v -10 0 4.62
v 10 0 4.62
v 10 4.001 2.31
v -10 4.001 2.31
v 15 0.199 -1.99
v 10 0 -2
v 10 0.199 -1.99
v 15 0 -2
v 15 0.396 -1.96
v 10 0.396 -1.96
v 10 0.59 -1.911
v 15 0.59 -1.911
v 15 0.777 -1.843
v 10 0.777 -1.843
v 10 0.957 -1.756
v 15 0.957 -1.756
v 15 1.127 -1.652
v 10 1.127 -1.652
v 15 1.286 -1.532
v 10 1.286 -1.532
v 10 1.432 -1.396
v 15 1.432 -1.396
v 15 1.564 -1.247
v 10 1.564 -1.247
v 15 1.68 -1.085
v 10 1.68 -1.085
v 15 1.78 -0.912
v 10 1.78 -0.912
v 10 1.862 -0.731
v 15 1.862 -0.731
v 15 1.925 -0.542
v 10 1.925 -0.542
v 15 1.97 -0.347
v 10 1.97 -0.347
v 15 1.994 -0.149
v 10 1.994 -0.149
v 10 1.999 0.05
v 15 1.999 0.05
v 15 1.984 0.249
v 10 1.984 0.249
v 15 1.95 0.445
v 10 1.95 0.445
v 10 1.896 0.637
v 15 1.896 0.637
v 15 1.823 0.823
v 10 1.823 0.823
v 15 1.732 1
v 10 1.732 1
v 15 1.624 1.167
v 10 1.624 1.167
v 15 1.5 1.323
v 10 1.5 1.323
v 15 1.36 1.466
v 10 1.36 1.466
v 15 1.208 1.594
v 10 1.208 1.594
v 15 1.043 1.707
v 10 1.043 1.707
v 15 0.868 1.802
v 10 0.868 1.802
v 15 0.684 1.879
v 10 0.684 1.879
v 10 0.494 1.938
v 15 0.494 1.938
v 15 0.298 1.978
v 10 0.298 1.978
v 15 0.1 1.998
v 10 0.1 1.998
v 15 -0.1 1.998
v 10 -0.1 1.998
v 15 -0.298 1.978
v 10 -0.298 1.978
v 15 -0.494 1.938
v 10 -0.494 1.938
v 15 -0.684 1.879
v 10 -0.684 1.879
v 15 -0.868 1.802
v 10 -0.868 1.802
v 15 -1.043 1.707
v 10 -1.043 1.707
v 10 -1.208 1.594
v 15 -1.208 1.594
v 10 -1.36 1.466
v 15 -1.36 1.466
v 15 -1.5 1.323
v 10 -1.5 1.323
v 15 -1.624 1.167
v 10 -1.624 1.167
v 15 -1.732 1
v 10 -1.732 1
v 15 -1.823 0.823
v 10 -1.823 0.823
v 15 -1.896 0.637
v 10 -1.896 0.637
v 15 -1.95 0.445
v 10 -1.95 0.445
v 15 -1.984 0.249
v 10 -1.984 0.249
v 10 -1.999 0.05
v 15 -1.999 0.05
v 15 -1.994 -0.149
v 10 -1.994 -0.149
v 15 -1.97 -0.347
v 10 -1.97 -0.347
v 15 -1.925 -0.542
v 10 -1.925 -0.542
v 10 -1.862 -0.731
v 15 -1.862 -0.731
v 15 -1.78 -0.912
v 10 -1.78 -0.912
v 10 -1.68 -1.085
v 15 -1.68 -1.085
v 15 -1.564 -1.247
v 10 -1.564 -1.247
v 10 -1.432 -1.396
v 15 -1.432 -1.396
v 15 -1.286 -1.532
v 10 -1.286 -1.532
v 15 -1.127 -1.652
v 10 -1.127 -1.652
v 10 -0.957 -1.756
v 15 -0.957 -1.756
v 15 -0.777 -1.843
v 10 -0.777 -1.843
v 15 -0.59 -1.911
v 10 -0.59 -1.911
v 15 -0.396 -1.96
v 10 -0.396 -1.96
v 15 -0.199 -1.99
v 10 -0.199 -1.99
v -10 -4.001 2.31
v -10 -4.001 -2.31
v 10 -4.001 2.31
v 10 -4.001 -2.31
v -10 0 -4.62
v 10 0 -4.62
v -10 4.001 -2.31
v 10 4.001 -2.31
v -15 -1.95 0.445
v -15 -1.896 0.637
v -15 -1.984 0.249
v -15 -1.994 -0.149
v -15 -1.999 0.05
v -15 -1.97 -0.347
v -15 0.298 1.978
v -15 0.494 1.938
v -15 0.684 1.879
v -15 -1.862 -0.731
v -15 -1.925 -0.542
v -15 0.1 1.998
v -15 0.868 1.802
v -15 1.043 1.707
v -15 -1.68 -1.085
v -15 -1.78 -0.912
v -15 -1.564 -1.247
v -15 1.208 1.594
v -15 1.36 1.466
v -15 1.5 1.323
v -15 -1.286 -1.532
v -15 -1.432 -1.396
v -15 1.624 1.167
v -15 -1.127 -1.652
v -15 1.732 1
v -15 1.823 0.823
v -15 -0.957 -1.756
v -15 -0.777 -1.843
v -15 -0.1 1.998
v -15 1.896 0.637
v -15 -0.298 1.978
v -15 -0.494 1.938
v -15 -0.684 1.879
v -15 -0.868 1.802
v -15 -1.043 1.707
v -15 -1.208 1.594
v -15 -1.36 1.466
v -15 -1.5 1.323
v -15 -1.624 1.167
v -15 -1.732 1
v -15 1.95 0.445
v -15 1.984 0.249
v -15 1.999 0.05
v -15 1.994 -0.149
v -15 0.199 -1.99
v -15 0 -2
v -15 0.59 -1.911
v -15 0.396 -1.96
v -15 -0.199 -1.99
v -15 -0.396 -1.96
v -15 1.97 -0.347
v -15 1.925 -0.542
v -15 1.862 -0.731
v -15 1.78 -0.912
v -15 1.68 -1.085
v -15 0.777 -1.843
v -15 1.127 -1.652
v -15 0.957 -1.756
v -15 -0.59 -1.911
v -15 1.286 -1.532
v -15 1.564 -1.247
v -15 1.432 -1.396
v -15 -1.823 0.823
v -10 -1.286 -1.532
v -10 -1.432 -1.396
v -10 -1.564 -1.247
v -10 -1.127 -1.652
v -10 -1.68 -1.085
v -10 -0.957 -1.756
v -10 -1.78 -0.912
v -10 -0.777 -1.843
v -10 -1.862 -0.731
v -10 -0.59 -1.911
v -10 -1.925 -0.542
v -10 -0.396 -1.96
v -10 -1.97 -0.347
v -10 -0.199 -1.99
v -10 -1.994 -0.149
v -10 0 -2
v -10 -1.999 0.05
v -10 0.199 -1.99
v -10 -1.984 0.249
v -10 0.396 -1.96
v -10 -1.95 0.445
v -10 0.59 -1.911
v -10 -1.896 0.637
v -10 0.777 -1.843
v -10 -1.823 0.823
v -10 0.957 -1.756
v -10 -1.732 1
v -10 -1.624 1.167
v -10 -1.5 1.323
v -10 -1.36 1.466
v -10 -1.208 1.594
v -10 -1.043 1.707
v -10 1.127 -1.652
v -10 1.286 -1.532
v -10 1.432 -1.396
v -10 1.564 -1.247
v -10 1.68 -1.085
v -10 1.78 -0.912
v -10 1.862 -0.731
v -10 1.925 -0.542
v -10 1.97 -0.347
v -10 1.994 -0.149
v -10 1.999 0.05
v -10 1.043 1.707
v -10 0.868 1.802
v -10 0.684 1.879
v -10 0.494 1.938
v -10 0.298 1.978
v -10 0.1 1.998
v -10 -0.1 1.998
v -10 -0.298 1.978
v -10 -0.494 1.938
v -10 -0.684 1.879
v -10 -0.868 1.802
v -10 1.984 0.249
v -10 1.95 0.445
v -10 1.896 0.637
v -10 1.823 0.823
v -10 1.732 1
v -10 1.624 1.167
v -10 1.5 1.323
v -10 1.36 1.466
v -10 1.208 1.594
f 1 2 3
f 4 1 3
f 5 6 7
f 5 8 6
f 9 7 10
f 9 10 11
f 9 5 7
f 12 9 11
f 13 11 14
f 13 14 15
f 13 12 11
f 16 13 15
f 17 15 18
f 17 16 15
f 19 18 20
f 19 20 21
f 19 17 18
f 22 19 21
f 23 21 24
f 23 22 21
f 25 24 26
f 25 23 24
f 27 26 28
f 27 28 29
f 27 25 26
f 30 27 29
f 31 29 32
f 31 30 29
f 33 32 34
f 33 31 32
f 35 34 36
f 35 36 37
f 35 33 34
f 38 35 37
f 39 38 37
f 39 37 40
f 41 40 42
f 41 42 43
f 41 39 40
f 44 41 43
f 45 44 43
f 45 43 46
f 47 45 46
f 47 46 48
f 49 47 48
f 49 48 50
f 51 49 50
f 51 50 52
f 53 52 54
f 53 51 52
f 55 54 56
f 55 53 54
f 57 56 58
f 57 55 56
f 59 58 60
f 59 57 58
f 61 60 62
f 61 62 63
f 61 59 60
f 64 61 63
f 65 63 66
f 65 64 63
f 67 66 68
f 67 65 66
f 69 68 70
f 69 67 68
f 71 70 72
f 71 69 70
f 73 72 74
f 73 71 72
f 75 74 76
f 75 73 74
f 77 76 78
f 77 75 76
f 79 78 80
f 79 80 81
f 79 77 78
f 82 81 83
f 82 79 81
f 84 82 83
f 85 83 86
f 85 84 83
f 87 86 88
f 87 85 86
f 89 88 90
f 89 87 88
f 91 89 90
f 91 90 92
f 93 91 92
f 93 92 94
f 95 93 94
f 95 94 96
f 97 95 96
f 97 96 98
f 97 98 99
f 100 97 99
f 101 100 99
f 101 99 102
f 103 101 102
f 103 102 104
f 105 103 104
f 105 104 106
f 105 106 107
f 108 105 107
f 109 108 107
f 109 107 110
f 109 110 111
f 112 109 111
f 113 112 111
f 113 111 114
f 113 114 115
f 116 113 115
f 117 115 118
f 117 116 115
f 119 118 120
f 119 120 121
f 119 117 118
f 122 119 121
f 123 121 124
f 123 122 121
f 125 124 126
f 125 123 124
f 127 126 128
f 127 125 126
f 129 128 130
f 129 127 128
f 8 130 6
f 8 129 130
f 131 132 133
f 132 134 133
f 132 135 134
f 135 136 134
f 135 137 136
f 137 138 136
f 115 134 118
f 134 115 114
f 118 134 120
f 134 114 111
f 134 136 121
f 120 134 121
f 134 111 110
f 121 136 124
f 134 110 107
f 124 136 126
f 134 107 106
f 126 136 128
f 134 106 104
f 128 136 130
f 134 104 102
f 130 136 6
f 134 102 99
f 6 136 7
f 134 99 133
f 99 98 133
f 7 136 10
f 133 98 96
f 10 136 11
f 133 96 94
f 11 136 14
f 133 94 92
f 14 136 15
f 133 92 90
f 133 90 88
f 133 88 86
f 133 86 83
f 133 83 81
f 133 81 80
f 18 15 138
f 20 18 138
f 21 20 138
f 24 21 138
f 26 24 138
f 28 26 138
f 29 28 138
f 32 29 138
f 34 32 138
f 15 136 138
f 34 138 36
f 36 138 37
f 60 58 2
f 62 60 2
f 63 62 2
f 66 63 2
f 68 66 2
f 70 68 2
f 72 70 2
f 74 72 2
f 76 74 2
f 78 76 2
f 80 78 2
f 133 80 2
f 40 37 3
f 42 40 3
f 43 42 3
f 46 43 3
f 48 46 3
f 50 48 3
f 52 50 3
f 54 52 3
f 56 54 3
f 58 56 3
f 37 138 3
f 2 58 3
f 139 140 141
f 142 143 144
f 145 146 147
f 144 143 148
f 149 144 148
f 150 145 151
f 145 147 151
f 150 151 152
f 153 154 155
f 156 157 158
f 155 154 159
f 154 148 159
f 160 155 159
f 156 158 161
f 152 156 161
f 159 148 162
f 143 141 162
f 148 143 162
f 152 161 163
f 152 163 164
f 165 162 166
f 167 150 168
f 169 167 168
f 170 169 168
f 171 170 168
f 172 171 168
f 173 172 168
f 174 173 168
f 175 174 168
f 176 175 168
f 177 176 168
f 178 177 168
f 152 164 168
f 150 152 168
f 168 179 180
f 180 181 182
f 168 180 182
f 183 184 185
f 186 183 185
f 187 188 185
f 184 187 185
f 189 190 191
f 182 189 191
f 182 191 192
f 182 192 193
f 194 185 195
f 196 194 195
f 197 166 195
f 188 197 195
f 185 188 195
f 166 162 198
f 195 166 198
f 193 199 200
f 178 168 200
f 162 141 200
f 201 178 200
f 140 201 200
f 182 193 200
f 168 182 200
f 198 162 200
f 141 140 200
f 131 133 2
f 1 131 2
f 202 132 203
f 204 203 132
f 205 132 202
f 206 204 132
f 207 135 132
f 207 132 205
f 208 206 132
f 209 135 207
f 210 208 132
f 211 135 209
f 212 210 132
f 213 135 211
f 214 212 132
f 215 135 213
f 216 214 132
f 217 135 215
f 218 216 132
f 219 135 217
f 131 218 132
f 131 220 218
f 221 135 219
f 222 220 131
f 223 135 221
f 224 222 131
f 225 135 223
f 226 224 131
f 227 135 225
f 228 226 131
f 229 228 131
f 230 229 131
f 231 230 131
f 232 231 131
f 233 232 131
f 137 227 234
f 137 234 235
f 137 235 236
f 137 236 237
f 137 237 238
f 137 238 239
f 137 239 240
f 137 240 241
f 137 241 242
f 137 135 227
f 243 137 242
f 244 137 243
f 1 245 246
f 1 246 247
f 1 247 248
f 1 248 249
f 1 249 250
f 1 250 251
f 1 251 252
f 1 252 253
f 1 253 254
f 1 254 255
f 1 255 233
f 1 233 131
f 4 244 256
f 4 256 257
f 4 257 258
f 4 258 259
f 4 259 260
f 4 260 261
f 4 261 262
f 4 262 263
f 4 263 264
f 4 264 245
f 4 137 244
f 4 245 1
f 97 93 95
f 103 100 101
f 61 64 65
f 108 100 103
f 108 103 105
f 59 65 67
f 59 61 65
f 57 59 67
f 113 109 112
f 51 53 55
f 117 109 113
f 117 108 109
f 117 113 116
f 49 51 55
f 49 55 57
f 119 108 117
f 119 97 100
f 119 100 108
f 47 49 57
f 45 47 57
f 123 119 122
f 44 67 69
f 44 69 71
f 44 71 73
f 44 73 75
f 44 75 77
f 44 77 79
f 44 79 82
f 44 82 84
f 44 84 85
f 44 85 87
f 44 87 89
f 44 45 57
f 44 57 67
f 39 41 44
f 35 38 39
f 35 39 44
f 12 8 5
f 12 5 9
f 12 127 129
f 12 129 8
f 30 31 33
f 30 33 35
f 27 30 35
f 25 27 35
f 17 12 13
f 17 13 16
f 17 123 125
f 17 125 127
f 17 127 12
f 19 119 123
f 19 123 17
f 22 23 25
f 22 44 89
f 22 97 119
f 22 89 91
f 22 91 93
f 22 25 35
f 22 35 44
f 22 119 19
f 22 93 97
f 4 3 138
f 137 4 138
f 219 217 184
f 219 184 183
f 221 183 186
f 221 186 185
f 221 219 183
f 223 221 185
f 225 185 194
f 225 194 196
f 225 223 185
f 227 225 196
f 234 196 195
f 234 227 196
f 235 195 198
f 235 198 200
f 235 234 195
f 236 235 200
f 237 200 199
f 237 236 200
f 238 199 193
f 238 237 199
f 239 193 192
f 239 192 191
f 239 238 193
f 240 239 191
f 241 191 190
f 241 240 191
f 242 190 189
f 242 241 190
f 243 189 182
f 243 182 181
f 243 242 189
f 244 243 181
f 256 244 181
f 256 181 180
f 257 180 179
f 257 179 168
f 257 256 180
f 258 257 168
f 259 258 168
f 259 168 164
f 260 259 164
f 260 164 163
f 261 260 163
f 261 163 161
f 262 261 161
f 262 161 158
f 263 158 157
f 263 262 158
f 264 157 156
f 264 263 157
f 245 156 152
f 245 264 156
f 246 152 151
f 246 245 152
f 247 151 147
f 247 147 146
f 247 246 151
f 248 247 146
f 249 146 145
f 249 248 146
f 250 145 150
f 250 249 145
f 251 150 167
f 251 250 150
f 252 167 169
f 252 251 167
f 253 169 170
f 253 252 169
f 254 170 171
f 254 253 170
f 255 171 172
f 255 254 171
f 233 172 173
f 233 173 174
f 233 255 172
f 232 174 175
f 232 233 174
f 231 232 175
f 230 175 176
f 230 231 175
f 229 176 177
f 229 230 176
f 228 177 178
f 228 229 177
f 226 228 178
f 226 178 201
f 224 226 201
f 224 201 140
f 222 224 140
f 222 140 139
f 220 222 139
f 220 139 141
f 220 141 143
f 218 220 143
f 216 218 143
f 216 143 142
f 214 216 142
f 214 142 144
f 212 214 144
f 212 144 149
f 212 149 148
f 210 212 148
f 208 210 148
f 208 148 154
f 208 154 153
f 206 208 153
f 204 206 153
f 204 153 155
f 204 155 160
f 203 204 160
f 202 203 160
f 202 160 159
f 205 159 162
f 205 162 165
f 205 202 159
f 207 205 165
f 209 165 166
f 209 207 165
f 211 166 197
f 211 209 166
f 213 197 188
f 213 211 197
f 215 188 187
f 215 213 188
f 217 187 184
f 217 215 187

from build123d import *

# Parameters (mm, degrees)
ESQUISSE1_R        = 2
BOSS_EXTRU_1_DEPTH = 15
ESQUISSE1_4_R      = 2
BOSS_EXTRU_2_DEPTH = 10


with BuildPart() as part:
    # Esquisse1 → Boss.-Extru.1 (new, symmetric)
    with BuildSketch(Plane(origin=(0, 0, 0), x_dir=(0, 0, -1), z_dir=(1, 0, 0))):
        Circle(ESQUISSE1_R)
    extrude(amount=BOSS_EXTRU_1_DEPTH, both=True)

    # Esquisse1<4> → Boss.-Extru.2 (add, symmetric)
    with BuildSketch(Plane(origin=(0, 0, 0), x_dir=(0, 0, -1), z_dir=(1, 0, 0))):
        Polygon((2.31, 4.001037365), (-2.31, 4.001037365), (-4.62, 0), (-2.31, -4.001037365), (2.31, -4.001037365), (4.62, 0), align=None)
        Circle(ESQUISSE1_4_R, mode=Mode.SUBTRACT)
    extrude(amount=BOSS_EXTRU_2_DEPTH, both=True)


solid = part.part
